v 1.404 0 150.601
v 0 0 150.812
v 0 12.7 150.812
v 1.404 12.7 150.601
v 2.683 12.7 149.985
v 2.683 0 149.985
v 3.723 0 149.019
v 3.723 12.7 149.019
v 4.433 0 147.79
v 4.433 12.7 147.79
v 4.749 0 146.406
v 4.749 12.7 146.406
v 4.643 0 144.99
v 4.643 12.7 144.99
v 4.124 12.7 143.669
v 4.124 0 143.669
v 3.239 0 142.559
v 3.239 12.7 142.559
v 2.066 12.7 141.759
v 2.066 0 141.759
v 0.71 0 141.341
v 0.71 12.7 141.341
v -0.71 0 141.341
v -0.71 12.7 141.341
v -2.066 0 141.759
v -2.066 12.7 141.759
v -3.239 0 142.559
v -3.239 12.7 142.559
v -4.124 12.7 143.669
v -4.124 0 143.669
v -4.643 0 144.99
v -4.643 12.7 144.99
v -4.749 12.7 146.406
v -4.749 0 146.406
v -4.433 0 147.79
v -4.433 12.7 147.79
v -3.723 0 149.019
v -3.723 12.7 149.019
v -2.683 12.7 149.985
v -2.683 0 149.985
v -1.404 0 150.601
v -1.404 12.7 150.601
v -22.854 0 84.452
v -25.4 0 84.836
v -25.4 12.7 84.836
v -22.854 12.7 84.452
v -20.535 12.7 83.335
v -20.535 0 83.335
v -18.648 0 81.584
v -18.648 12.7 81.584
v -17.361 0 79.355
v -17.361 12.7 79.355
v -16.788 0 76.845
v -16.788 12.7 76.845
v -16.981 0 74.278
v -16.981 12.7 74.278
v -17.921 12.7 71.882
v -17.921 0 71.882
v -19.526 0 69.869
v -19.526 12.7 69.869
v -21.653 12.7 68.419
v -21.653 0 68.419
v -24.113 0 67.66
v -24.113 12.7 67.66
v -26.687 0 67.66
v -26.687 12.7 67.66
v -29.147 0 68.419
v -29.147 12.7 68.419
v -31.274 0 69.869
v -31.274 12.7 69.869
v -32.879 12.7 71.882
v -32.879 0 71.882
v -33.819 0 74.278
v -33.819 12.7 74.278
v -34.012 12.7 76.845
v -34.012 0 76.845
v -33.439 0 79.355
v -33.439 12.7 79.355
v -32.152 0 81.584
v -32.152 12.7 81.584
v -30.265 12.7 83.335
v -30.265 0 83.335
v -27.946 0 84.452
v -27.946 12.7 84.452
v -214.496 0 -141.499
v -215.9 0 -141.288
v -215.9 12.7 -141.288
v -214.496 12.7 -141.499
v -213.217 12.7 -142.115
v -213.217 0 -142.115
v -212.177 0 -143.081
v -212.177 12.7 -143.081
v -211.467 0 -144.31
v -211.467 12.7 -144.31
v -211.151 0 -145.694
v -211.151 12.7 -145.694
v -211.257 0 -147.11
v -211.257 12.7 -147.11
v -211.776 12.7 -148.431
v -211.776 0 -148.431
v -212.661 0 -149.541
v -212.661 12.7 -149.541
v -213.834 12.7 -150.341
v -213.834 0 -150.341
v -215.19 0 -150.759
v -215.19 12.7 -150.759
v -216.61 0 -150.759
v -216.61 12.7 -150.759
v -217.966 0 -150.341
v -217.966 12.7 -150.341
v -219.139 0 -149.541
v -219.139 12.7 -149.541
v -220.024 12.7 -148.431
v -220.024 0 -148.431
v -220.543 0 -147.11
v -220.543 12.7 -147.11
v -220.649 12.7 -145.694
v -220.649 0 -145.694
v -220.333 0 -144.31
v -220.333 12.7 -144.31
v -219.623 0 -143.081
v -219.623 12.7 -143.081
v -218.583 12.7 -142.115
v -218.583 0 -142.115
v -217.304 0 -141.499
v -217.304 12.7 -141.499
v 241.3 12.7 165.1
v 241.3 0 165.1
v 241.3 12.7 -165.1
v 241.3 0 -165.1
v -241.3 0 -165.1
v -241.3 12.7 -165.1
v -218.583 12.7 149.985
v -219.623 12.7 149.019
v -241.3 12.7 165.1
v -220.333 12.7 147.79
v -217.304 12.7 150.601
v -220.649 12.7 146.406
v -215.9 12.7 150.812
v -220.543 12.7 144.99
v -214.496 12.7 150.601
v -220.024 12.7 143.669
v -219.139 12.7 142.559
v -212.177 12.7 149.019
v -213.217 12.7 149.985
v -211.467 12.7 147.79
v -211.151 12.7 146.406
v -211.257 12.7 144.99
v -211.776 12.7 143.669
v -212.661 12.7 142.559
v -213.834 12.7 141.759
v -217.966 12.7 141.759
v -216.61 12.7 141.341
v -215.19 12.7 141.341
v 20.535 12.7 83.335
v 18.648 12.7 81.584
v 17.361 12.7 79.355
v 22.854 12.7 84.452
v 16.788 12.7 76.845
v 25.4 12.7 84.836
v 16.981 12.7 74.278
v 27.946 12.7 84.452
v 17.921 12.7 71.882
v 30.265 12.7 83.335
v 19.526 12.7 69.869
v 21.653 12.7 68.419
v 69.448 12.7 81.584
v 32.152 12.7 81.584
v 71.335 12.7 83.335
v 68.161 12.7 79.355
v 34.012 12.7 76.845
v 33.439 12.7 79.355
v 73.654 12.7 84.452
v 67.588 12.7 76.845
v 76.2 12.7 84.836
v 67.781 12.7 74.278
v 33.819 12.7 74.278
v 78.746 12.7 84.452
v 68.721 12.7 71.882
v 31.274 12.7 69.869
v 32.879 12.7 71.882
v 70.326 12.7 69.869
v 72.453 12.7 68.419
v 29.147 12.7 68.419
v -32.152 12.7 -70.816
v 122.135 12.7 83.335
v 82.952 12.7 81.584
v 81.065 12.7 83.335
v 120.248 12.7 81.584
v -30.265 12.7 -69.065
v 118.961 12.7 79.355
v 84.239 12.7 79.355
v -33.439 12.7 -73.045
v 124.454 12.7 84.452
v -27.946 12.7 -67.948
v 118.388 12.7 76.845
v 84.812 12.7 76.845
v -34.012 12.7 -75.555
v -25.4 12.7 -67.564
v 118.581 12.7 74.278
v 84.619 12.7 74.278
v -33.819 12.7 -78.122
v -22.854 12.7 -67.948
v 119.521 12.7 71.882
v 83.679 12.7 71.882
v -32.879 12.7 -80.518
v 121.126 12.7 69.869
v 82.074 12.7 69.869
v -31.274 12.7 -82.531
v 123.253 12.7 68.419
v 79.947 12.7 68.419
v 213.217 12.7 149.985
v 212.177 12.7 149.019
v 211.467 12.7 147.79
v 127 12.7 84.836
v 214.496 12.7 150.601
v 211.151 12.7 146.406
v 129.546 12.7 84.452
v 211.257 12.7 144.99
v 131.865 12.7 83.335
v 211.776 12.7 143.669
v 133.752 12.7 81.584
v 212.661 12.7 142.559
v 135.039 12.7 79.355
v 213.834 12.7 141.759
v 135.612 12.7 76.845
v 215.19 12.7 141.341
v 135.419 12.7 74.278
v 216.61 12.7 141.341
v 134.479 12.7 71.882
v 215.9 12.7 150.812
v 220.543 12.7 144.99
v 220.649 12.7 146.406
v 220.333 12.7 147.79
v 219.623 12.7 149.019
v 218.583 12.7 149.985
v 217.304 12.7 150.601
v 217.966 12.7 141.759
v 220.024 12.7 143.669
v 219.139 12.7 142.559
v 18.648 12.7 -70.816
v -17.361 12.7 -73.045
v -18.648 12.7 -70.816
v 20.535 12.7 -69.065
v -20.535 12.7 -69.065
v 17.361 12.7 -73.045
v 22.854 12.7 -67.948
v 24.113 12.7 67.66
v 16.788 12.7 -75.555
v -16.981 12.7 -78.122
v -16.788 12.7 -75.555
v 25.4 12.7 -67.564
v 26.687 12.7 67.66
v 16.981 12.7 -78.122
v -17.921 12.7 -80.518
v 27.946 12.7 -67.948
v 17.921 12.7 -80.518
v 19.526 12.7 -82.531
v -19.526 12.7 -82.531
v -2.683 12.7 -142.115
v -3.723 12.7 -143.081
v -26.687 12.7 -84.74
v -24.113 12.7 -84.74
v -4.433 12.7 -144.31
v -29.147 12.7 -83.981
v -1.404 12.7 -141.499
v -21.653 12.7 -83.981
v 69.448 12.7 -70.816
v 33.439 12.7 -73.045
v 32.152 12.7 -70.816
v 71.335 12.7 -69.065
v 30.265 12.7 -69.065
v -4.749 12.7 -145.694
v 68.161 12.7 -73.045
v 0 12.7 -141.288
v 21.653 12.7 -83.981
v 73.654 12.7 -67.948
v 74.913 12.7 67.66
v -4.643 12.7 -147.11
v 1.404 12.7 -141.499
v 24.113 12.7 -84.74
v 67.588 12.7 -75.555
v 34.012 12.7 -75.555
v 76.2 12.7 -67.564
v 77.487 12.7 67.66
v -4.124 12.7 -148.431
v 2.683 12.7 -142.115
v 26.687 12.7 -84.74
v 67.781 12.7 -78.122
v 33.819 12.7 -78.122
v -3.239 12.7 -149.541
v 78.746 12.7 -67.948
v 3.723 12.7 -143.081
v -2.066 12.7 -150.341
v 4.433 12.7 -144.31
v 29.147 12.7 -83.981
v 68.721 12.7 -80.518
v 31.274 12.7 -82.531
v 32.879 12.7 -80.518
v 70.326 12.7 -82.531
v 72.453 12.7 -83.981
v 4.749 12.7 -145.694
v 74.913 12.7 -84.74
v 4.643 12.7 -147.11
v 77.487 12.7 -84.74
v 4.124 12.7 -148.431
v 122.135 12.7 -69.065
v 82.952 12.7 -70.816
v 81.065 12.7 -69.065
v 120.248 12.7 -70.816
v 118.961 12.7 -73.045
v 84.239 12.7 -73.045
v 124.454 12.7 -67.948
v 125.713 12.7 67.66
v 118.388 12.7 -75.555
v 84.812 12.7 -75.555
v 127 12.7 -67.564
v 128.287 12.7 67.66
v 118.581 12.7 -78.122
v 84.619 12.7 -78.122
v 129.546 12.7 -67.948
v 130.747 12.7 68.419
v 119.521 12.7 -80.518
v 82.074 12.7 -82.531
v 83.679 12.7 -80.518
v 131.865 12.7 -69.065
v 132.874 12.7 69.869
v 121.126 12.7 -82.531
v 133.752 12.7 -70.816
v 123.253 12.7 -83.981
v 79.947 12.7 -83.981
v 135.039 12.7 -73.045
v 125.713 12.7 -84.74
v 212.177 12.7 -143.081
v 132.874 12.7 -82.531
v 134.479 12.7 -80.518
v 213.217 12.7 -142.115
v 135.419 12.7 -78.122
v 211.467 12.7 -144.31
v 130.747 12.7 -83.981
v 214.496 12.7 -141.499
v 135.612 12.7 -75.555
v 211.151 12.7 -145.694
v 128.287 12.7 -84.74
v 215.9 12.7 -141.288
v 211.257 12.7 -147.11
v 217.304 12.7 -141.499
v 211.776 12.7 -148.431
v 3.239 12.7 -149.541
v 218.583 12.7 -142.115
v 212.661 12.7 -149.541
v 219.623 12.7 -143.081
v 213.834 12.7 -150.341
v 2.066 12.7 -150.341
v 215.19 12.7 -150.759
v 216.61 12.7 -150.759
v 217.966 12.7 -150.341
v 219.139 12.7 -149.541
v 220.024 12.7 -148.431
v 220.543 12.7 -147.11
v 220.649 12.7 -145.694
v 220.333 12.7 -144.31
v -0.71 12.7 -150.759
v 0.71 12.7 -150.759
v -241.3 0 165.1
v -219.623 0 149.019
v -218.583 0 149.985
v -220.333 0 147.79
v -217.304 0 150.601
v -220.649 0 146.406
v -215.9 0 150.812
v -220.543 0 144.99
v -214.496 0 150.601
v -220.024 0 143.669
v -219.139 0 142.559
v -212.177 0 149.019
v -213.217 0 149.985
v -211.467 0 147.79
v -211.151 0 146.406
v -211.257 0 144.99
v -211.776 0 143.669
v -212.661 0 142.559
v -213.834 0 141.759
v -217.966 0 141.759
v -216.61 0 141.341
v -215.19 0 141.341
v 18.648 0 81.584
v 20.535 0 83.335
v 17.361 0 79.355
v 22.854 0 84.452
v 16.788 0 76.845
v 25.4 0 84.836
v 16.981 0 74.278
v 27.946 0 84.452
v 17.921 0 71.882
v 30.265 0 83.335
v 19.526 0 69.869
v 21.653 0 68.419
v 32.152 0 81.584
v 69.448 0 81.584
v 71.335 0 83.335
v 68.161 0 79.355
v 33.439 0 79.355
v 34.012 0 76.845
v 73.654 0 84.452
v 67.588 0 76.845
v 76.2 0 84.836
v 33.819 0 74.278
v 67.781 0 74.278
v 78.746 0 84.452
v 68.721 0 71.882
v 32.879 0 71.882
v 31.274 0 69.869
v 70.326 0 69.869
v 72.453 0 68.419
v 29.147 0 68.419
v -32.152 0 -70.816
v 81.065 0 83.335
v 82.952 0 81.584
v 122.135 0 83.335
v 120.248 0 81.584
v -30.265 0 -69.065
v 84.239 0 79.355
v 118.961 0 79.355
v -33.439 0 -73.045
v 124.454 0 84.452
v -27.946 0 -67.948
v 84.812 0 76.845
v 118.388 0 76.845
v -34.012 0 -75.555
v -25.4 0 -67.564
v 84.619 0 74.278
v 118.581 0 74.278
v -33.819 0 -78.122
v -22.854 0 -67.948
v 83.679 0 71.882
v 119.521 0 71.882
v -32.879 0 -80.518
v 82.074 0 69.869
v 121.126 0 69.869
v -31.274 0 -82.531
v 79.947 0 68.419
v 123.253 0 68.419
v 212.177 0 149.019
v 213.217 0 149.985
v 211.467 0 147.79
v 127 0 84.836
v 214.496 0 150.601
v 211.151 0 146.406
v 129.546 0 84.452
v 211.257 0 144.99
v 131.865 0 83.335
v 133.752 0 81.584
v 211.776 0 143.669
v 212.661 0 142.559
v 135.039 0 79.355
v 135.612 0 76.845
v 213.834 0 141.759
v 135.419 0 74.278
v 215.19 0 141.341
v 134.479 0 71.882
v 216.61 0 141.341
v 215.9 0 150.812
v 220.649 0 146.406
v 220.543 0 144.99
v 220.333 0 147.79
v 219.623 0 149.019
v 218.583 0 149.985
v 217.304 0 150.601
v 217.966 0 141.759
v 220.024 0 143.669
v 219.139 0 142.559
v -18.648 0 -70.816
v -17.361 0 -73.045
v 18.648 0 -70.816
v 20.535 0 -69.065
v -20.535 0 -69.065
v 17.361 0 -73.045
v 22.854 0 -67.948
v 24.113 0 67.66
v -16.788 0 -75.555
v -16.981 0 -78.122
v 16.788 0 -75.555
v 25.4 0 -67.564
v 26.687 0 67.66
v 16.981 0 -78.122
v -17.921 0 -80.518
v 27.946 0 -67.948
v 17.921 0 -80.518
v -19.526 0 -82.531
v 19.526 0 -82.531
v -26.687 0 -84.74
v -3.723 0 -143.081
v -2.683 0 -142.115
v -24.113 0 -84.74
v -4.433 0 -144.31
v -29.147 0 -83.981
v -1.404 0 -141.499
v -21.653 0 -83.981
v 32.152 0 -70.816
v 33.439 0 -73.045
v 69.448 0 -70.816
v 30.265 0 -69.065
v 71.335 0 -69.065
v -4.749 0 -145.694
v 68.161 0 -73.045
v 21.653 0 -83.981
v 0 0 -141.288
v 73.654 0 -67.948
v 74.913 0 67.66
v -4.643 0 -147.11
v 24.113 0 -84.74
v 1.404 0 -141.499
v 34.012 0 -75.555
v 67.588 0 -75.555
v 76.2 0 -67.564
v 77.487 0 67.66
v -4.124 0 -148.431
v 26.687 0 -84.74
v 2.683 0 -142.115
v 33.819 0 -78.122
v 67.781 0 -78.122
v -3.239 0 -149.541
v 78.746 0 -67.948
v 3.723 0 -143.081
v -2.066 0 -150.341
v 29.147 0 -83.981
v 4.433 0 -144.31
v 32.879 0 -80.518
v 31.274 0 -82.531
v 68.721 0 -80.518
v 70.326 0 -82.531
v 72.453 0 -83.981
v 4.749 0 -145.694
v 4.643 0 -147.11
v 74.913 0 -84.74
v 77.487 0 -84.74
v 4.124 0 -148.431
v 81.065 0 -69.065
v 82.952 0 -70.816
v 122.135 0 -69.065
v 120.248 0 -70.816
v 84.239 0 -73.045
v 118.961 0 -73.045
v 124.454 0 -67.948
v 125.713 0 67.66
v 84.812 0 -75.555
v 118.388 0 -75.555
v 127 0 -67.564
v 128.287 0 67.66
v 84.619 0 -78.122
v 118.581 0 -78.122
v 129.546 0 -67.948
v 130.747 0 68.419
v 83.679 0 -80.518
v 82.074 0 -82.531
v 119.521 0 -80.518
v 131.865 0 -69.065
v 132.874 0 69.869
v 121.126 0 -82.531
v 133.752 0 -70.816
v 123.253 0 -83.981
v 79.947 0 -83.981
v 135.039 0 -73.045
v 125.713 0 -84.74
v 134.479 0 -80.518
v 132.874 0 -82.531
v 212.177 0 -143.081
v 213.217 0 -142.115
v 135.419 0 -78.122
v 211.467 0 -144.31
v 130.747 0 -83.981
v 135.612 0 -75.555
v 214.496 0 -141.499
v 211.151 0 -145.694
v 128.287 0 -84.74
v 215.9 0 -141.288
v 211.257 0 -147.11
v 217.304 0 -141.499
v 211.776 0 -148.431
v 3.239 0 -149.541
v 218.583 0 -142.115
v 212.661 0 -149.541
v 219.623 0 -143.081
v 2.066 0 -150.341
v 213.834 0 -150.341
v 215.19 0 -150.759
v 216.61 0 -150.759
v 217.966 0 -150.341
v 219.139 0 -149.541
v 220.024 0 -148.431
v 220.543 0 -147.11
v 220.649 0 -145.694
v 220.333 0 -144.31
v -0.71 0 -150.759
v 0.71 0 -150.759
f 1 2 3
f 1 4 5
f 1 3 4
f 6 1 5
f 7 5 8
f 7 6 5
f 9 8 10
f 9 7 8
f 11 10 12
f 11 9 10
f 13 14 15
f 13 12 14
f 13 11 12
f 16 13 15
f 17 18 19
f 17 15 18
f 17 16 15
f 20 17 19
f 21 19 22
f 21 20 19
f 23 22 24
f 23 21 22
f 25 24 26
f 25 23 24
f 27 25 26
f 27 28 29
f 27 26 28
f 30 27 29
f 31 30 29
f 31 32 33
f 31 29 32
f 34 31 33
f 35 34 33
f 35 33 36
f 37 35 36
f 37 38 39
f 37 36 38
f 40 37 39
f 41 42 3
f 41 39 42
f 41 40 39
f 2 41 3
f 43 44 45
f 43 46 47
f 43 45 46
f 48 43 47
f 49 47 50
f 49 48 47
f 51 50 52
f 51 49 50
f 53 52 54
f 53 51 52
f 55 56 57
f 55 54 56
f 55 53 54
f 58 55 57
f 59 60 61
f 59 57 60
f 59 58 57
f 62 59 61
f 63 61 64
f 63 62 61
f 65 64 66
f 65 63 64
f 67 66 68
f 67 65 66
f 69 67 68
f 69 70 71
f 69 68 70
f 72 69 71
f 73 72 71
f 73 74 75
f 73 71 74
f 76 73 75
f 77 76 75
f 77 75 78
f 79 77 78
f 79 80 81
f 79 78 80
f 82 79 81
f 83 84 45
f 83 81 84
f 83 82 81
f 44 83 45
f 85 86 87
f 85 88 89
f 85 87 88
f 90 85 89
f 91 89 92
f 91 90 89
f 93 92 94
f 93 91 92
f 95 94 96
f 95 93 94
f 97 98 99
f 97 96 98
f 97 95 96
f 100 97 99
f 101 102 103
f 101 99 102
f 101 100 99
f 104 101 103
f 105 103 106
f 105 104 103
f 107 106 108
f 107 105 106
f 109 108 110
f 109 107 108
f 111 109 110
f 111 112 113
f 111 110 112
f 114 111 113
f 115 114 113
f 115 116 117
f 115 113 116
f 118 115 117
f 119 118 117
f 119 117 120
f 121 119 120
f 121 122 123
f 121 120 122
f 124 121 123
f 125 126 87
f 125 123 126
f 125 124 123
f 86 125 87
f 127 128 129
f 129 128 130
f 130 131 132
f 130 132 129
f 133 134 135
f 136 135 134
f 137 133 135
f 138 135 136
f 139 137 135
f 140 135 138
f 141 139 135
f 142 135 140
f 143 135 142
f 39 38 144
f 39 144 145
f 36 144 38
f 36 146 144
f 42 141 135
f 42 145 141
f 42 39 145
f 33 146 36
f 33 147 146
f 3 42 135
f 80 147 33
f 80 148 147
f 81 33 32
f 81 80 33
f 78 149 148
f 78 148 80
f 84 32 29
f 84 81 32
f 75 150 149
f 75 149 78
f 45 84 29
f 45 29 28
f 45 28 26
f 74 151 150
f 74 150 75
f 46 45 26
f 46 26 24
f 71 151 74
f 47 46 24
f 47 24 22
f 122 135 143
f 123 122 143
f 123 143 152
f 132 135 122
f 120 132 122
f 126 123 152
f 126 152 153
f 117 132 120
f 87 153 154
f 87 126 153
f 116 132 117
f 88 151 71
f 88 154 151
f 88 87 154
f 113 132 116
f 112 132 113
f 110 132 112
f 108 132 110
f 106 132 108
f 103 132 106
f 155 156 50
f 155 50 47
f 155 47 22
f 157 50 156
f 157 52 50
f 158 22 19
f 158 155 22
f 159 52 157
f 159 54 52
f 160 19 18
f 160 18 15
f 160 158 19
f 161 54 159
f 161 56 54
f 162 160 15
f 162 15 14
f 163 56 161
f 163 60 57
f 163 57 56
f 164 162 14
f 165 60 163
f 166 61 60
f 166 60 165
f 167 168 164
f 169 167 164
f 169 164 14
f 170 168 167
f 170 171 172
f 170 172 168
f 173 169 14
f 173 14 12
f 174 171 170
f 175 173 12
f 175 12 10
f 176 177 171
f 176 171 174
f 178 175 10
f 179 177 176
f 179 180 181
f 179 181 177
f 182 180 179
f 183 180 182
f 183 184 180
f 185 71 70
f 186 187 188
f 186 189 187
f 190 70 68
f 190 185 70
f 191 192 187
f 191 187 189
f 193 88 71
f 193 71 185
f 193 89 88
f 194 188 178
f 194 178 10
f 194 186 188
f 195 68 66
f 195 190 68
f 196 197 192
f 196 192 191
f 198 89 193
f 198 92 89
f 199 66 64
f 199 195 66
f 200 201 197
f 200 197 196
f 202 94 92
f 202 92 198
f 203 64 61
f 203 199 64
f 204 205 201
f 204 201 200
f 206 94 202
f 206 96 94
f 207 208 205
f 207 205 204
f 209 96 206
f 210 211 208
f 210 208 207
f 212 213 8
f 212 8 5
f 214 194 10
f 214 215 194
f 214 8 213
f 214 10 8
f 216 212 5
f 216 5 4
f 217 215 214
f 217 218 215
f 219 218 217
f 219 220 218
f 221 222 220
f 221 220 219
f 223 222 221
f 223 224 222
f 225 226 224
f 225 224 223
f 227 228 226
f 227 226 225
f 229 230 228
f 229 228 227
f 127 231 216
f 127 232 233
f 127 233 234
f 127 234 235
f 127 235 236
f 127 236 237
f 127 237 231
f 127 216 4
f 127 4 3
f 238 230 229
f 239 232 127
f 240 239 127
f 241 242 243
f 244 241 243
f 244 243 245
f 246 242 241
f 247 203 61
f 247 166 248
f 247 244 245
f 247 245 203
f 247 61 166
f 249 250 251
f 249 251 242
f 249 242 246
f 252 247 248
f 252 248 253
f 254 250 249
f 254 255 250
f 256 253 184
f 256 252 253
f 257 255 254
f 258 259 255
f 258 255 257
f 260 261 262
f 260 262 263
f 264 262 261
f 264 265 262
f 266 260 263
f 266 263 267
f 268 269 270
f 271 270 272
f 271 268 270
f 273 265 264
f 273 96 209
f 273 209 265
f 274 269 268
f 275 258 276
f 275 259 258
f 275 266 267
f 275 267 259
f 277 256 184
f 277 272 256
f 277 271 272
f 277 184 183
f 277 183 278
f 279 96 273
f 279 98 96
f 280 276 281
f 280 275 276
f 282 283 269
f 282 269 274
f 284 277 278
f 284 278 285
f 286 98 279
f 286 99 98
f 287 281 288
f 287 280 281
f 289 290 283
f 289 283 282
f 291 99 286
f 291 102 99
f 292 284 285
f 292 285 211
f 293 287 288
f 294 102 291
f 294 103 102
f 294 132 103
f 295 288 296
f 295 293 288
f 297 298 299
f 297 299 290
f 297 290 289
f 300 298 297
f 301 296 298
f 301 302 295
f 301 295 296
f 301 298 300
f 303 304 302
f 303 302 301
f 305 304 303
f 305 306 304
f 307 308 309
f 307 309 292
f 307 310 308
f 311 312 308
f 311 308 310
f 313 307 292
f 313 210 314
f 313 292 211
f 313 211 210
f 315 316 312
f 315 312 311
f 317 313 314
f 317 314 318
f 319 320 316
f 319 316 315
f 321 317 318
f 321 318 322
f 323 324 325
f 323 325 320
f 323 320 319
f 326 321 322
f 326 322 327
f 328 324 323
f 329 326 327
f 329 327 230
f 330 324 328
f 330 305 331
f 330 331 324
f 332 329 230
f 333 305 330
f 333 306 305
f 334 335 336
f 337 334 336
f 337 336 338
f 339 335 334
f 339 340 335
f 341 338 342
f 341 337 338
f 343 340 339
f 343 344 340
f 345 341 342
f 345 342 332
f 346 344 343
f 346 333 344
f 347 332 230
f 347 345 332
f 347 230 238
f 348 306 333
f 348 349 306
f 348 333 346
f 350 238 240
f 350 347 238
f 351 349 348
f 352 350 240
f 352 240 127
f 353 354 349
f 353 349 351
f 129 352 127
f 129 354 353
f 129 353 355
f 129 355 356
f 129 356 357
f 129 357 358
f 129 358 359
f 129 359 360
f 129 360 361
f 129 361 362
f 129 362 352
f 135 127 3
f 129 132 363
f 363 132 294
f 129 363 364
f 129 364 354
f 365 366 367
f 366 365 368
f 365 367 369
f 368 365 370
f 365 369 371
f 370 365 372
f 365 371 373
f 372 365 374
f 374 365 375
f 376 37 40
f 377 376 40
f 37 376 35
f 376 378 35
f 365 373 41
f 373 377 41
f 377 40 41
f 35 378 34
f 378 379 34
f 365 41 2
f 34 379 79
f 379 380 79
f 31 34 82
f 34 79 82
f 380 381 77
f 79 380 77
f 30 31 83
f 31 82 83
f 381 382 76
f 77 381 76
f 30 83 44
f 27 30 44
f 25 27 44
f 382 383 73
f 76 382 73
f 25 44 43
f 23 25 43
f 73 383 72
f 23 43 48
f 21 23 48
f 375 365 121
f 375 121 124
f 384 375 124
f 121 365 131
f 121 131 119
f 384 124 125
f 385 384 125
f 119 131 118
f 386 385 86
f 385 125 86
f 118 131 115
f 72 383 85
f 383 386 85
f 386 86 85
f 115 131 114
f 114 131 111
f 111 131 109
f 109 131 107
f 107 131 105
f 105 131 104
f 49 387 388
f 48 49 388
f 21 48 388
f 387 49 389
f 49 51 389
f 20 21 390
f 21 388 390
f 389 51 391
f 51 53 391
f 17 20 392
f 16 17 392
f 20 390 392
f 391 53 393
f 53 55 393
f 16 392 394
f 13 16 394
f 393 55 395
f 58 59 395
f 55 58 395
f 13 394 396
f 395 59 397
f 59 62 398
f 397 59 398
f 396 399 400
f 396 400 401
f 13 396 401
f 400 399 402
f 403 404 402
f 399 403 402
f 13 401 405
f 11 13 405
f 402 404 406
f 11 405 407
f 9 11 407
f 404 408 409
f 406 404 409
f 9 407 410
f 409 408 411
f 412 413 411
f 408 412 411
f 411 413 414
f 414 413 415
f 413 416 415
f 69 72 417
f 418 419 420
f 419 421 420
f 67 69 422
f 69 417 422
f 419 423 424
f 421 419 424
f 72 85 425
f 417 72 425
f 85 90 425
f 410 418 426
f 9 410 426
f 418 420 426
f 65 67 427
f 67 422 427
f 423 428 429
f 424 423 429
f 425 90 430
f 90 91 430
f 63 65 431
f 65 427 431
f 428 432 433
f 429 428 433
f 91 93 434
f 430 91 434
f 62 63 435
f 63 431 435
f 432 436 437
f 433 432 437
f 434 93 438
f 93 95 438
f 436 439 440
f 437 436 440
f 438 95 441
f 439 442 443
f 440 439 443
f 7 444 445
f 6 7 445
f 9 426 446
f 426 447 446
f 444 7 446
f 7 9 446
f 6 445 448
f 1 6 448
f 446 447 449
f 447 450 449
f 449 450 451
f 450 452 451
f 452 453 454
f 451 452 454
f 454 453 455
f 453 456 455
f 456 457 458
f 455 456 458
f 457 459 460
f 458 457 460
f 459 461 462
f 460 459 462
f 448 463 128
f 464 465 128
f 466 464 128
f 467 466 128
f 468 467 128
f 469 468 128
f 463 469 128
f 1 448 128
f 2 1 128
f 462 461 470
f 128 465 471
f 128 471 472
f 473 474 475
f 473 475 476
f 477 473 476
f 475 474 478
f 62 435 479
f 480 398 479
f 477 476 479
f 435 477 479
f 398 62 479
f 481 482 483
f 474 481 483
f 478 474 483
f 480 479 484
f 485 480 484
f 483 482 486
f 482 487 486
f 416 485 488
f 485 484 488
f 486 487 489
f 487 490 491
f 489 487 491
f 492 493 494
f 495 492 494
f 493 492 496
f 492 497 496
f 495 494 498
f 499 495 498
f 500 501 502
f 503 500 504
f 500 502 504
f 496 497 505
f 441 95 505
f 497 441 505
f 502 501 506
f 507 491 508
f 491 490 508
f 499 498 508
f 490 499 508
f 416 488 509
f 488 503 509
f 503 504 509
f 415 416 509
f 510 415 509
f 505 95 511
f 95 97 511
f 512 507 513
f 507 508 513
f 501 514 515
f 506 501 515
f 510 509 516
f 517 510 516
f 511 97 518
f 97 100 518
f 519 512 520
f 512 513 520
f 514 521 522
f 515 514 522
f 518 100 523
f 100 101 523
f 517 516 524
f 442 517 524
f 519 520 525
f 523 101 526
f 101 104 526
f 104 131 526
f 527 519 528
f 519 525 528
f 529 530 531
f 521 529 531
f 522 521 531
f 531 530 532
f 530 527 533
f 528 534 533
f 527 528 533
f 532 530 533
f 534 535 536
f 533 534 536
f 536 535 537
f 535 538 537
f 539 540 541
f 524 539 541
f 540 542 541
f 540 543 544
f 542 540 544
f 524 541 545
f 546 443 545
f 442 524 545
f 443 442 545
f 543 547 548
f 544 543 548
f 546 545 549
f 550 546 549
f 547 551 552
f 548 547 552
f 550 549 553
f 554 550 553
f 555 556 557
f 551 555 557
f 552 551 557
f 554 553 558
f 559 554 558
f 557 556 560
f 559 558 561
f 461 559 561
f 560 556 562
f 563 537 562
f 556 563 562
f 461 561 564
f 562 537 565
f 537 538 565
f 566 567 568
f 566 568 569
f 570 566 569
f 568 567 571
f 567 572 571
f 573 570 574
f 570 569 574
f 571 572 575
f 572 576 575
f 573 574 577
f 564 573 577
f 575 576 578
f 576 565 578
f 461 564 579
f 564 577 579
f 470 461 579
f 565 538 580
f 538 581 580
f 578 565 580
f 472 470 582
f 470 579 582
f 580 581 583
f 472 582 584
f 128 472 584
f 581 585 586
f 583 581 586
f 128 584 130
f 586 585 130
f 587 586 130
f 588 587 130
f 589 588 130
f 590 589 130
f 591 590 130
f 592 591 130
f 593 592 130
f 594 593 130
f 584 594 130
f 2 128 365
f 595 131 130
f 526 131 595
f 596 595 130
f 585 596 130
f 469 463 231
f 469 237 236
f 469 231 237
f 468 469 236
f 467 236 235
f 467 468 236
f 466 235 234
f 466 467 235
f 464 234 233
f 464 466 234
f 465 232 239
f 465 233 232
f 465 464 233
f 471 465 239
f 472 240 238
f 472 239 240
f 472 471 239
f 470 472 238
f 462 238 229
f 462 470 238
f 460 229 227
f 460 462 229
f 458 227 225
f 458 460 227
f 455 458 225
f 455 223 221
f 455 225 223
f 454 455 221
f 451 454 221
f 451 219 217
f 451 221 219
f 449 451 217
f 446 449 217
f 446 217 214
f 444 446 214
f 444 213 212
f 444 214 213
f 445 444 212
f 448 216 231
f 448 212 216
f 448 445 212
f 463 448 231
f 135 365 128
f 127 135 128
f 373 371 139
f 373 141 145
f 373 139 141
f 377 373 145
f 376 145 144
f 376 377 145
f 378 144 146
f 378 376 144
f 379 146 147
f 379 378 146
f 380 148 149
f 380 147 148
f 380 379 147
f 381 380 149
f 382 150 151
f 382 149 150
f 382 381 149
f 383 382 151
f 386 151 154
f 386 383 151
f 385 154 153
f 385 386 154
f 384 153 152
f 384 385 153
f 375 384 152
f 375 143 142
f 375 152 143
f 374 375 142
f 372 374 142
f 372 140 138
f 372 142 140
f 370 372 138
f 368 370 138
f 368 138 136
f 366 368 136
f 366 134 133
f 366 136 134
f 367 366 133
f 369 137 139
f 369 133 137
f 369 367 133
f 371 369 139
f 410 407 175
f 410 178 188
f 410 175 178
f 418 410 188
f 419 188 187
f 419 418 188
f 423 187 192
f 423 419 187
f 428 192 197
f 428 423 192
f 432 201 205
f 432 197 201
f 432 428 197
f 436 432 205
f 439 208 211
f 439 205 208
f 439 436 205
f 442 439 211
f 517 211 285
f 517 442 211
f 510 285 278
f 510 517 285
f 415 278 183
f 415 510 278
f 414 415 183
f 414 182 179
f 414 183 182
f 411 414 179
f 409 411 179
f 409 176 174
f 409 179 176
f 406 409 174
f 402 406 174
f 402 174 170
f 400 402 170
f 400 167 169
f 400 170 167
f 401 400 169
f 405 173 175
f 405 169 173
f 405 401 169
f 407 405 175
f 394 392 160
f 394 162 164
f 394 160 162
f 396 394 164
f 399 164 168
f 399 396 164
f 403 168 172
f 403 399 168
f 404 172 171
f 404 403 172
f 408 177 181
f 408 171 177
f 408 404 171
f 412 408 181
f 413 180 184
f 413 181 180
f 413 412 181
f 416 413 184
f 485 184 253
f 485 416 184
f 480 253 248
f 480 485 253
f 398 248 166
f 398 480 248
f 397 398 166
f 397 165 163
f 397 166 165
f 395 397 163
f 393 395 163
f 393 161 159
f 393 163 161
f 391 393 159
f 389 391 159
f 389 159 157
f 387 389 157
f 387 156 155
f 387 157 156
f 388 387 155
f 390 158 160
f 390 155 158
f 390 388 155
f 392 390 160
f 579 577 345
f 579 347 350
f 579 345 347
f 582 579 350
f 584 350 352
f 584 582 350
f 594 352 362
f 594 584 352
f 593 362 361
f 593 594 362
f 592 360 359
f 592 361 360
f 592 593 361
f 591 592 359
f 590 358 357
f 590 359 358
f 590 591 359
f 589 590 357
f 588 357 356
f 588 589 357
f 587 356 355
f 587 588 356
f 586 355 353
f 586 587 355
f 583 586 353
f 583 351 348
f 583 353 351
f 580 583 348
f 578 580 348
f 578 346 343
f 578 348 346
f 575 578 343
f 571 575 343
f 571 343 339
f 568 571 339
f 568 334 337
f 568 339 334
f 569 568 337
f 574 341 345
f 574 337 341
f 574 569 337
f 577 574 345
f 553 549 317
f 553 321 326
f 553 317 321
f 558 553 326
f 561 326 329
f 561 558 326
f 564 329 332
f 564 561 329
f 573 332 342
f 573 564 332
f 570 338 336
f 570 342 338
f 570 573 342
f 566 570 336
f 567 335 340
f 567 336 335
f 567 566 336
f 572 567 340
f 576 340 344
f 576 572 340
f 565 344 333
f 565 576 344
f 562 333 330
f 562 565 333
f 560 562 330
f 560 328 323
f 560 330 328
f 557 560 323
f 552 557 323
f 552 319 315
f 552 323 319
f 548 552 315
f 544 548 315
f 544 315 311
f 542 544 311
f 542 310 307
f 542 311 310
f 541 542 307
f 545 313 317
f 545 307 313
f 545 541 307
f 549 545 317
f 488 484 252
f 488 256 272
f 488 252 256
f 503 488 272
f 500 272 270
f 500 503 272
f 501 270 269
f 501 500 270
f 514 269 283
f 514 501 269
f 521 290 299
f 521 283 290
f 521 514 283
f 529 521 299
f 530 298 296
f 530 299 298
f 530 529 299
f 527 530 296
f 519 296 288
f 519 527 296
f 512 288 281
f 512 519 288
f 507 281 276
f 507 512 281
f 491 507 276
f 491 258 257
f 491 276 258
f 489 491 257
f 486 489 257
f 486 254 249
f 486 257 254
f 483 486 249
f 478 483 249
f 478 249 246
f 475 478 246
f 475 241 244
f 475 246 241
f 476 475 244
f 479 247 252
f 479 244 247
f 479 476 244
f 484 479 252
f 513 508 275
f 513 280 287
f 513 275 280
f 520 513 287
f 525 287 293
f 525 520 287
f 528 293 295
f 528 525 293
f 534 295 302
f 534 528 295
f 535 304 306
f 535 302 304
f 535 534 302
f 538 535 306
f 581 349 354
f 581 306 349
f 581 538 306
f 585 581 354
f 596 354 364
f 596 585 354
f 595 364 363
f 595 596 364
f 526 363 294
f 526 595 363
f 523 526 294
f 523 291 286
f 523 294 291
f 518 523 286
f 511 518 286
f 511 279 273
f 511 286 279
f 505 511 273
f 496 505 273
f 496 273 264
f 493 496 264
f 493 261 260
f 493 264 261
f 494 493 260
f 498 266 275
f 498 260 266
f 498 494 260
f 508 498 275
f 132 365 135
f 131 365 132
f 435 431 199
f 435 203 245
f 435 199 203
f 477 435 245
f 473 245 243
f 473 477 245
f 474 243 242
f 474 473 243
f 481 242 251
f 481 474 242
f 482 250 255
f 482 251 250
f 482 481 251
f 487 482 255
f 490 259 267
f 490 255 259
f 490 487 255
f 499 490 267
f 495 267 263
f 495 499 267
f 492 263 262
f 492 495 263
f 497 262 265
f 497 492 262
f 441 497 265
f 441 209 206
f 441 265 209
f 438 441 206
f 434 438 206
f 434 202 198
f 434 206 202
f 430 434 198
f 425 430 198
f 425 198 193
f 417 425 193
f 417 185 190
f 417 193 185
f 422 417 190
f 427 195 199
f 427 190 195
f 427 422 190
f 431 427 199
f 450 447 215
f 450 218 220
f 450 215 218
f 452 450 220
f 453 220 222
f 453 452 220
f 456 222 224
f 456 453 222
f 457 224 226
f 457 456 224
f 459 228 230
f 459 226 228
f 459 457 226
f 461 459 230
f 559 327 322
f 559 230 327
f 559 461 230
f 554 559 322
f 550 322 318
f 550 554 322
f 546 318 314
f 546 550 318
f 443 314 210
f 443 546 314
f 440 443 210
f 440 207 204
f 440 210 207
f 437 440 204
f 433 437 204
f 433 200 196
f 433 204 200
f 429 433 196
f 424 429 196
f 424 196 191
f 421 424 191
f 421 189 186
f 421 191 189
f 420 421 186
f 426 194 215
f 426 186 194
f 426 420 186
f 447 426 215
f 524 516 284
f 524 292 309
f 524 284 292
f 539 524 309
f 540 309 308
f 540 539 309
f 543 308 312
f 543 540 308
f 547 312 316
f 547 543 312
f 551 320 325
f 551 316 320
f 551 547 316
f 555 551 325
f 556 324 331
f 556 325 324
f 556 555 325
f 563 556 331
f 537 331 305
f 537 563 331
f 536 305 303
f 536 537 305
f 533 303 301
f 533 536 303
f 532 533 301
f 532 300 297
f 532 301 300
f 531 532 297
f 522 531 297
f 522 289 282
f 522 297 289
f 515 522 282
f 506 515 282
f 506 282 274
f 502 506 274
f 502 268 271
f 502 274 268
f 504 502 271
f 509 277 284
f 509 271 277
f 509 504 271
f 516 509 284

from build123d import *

# Parameters (mm, degrees)
SKETCH1_W               = 482.6
SKETCH1_H               = 330.2
BOSS_EXTRUDE1_DEPTH     = 12.7
CUT_EXTRUDE1_DEPTH      = 293.651652994
CUT_EXTRUDE1_DEPTH_BACK = 293.651652994
SKETCH2_R               = 4.7625
CUT_EXTRUDE2_DEPTH      = 293.651652994
CUT_EXTRUDE2_DEPTH_BACK = 293.651652994
SKETCH4_R               = 8.636


with BuildPart() as part:
    # Sketch1 → Boss-Extrude1 (new body)
    with BuildSketch(Plane(origin=(0, 0, 0), x_dir=(1, 0, 0), z_dir=(0, 1, 0))):
        Rectangle(SKETCH1_W, SKETCH1_H)
    extrude(amount=BOSS_EXTRUDE1_DEPTH)

    # Sketch2 → Cut-Extrude1 (cut, two sides: drawn at the far end of the back side and taken through both)
    with BuildSketch(Plane(origin=(0, 12.7, 0), x_dir=(1, 0, 0), z_dir=(0, 1, 0)).offset(-CUT_EXTRUDE1_DEPTH_BACK)):
        with Locations(Location((215.9, 146.05, 0), (0, 0, 270))):
            Circle(SKETCH2_R)
        with Locations(Location((-215.9, 146.05, 0), (0, 0, 270))):
            Circle(SKETCH2_R)
        with Locations(Location((215.9, -146.05, 0), (0, 0, 270))):
            Circle(SKETCH2_R)
        with Locations(Location((-215.9, -146.05, 0), (0, 0, 270))):
            Circle(SKETCH2_R)
        with Locations(Location((0, 146.05, 0), (0, 0, 270))):
            Circle(SKETCH2_R)
        with Locations(Location((0, -146.05, 0), (0, 0, 270))):
            Circle(SKETCH2_R)
    extrude(amount=CUT_EXTRUDE1_DEPTH + CUT_EXTRUDE1_DEPTH_BACK, mode=Mode.SUBTRACT)

    # Sketch4 → Cut-Extrude2 (cut, two sides: drawn at the far end of the back side and taken through both)
    with BuildSketch(Plane(origin=(0, 12.7, 0), x_dir=(1, 0, 0), z_dir=(0, 1, 0)).offset(-CUT_EXTRUDE2_DEPTH_BACK)):
        with Locations(Location((-25.4, 76.2, 0), (0, 0, 270))):
            Circle(SKETCH4_R)
        with Locations(Location((25.4, 76.2, 0), (0, 0, 270))):
            Circle(SKETCH4_R)
        with Locations(Location((76.2, 76.2, 0), (0, 0, 270))):
            Circle(SKETCH4_R)
        with Locations(Location((127, 76.2, 0), (0, 0, 270))):
            Circle(SKETCH4_R)
        with Locations(Location((127, -76.2, 0), (0, 0, 270))):
            Circle(SKETCH4_R)
        with Locations(Location((76.2, -76.2, 0), (0, 0, 270))):
            Circle(SKETCH4_R)
        with Locations(Location((25.4, -76.2, 0), (0, 0, 270))):
            Circle(SKETCH4_R)
        with Locations(Location((-25.4, -76.2, 0), (0, 0, 270))):
            Circle(SKETCH4_R)
    extrude(amount=CUT_EXTRUDE2_DEPTH + CUT_EXTRUDE2_DEPTH_BACK, mode=Mode.SUBTRACT)


solid = part.part
